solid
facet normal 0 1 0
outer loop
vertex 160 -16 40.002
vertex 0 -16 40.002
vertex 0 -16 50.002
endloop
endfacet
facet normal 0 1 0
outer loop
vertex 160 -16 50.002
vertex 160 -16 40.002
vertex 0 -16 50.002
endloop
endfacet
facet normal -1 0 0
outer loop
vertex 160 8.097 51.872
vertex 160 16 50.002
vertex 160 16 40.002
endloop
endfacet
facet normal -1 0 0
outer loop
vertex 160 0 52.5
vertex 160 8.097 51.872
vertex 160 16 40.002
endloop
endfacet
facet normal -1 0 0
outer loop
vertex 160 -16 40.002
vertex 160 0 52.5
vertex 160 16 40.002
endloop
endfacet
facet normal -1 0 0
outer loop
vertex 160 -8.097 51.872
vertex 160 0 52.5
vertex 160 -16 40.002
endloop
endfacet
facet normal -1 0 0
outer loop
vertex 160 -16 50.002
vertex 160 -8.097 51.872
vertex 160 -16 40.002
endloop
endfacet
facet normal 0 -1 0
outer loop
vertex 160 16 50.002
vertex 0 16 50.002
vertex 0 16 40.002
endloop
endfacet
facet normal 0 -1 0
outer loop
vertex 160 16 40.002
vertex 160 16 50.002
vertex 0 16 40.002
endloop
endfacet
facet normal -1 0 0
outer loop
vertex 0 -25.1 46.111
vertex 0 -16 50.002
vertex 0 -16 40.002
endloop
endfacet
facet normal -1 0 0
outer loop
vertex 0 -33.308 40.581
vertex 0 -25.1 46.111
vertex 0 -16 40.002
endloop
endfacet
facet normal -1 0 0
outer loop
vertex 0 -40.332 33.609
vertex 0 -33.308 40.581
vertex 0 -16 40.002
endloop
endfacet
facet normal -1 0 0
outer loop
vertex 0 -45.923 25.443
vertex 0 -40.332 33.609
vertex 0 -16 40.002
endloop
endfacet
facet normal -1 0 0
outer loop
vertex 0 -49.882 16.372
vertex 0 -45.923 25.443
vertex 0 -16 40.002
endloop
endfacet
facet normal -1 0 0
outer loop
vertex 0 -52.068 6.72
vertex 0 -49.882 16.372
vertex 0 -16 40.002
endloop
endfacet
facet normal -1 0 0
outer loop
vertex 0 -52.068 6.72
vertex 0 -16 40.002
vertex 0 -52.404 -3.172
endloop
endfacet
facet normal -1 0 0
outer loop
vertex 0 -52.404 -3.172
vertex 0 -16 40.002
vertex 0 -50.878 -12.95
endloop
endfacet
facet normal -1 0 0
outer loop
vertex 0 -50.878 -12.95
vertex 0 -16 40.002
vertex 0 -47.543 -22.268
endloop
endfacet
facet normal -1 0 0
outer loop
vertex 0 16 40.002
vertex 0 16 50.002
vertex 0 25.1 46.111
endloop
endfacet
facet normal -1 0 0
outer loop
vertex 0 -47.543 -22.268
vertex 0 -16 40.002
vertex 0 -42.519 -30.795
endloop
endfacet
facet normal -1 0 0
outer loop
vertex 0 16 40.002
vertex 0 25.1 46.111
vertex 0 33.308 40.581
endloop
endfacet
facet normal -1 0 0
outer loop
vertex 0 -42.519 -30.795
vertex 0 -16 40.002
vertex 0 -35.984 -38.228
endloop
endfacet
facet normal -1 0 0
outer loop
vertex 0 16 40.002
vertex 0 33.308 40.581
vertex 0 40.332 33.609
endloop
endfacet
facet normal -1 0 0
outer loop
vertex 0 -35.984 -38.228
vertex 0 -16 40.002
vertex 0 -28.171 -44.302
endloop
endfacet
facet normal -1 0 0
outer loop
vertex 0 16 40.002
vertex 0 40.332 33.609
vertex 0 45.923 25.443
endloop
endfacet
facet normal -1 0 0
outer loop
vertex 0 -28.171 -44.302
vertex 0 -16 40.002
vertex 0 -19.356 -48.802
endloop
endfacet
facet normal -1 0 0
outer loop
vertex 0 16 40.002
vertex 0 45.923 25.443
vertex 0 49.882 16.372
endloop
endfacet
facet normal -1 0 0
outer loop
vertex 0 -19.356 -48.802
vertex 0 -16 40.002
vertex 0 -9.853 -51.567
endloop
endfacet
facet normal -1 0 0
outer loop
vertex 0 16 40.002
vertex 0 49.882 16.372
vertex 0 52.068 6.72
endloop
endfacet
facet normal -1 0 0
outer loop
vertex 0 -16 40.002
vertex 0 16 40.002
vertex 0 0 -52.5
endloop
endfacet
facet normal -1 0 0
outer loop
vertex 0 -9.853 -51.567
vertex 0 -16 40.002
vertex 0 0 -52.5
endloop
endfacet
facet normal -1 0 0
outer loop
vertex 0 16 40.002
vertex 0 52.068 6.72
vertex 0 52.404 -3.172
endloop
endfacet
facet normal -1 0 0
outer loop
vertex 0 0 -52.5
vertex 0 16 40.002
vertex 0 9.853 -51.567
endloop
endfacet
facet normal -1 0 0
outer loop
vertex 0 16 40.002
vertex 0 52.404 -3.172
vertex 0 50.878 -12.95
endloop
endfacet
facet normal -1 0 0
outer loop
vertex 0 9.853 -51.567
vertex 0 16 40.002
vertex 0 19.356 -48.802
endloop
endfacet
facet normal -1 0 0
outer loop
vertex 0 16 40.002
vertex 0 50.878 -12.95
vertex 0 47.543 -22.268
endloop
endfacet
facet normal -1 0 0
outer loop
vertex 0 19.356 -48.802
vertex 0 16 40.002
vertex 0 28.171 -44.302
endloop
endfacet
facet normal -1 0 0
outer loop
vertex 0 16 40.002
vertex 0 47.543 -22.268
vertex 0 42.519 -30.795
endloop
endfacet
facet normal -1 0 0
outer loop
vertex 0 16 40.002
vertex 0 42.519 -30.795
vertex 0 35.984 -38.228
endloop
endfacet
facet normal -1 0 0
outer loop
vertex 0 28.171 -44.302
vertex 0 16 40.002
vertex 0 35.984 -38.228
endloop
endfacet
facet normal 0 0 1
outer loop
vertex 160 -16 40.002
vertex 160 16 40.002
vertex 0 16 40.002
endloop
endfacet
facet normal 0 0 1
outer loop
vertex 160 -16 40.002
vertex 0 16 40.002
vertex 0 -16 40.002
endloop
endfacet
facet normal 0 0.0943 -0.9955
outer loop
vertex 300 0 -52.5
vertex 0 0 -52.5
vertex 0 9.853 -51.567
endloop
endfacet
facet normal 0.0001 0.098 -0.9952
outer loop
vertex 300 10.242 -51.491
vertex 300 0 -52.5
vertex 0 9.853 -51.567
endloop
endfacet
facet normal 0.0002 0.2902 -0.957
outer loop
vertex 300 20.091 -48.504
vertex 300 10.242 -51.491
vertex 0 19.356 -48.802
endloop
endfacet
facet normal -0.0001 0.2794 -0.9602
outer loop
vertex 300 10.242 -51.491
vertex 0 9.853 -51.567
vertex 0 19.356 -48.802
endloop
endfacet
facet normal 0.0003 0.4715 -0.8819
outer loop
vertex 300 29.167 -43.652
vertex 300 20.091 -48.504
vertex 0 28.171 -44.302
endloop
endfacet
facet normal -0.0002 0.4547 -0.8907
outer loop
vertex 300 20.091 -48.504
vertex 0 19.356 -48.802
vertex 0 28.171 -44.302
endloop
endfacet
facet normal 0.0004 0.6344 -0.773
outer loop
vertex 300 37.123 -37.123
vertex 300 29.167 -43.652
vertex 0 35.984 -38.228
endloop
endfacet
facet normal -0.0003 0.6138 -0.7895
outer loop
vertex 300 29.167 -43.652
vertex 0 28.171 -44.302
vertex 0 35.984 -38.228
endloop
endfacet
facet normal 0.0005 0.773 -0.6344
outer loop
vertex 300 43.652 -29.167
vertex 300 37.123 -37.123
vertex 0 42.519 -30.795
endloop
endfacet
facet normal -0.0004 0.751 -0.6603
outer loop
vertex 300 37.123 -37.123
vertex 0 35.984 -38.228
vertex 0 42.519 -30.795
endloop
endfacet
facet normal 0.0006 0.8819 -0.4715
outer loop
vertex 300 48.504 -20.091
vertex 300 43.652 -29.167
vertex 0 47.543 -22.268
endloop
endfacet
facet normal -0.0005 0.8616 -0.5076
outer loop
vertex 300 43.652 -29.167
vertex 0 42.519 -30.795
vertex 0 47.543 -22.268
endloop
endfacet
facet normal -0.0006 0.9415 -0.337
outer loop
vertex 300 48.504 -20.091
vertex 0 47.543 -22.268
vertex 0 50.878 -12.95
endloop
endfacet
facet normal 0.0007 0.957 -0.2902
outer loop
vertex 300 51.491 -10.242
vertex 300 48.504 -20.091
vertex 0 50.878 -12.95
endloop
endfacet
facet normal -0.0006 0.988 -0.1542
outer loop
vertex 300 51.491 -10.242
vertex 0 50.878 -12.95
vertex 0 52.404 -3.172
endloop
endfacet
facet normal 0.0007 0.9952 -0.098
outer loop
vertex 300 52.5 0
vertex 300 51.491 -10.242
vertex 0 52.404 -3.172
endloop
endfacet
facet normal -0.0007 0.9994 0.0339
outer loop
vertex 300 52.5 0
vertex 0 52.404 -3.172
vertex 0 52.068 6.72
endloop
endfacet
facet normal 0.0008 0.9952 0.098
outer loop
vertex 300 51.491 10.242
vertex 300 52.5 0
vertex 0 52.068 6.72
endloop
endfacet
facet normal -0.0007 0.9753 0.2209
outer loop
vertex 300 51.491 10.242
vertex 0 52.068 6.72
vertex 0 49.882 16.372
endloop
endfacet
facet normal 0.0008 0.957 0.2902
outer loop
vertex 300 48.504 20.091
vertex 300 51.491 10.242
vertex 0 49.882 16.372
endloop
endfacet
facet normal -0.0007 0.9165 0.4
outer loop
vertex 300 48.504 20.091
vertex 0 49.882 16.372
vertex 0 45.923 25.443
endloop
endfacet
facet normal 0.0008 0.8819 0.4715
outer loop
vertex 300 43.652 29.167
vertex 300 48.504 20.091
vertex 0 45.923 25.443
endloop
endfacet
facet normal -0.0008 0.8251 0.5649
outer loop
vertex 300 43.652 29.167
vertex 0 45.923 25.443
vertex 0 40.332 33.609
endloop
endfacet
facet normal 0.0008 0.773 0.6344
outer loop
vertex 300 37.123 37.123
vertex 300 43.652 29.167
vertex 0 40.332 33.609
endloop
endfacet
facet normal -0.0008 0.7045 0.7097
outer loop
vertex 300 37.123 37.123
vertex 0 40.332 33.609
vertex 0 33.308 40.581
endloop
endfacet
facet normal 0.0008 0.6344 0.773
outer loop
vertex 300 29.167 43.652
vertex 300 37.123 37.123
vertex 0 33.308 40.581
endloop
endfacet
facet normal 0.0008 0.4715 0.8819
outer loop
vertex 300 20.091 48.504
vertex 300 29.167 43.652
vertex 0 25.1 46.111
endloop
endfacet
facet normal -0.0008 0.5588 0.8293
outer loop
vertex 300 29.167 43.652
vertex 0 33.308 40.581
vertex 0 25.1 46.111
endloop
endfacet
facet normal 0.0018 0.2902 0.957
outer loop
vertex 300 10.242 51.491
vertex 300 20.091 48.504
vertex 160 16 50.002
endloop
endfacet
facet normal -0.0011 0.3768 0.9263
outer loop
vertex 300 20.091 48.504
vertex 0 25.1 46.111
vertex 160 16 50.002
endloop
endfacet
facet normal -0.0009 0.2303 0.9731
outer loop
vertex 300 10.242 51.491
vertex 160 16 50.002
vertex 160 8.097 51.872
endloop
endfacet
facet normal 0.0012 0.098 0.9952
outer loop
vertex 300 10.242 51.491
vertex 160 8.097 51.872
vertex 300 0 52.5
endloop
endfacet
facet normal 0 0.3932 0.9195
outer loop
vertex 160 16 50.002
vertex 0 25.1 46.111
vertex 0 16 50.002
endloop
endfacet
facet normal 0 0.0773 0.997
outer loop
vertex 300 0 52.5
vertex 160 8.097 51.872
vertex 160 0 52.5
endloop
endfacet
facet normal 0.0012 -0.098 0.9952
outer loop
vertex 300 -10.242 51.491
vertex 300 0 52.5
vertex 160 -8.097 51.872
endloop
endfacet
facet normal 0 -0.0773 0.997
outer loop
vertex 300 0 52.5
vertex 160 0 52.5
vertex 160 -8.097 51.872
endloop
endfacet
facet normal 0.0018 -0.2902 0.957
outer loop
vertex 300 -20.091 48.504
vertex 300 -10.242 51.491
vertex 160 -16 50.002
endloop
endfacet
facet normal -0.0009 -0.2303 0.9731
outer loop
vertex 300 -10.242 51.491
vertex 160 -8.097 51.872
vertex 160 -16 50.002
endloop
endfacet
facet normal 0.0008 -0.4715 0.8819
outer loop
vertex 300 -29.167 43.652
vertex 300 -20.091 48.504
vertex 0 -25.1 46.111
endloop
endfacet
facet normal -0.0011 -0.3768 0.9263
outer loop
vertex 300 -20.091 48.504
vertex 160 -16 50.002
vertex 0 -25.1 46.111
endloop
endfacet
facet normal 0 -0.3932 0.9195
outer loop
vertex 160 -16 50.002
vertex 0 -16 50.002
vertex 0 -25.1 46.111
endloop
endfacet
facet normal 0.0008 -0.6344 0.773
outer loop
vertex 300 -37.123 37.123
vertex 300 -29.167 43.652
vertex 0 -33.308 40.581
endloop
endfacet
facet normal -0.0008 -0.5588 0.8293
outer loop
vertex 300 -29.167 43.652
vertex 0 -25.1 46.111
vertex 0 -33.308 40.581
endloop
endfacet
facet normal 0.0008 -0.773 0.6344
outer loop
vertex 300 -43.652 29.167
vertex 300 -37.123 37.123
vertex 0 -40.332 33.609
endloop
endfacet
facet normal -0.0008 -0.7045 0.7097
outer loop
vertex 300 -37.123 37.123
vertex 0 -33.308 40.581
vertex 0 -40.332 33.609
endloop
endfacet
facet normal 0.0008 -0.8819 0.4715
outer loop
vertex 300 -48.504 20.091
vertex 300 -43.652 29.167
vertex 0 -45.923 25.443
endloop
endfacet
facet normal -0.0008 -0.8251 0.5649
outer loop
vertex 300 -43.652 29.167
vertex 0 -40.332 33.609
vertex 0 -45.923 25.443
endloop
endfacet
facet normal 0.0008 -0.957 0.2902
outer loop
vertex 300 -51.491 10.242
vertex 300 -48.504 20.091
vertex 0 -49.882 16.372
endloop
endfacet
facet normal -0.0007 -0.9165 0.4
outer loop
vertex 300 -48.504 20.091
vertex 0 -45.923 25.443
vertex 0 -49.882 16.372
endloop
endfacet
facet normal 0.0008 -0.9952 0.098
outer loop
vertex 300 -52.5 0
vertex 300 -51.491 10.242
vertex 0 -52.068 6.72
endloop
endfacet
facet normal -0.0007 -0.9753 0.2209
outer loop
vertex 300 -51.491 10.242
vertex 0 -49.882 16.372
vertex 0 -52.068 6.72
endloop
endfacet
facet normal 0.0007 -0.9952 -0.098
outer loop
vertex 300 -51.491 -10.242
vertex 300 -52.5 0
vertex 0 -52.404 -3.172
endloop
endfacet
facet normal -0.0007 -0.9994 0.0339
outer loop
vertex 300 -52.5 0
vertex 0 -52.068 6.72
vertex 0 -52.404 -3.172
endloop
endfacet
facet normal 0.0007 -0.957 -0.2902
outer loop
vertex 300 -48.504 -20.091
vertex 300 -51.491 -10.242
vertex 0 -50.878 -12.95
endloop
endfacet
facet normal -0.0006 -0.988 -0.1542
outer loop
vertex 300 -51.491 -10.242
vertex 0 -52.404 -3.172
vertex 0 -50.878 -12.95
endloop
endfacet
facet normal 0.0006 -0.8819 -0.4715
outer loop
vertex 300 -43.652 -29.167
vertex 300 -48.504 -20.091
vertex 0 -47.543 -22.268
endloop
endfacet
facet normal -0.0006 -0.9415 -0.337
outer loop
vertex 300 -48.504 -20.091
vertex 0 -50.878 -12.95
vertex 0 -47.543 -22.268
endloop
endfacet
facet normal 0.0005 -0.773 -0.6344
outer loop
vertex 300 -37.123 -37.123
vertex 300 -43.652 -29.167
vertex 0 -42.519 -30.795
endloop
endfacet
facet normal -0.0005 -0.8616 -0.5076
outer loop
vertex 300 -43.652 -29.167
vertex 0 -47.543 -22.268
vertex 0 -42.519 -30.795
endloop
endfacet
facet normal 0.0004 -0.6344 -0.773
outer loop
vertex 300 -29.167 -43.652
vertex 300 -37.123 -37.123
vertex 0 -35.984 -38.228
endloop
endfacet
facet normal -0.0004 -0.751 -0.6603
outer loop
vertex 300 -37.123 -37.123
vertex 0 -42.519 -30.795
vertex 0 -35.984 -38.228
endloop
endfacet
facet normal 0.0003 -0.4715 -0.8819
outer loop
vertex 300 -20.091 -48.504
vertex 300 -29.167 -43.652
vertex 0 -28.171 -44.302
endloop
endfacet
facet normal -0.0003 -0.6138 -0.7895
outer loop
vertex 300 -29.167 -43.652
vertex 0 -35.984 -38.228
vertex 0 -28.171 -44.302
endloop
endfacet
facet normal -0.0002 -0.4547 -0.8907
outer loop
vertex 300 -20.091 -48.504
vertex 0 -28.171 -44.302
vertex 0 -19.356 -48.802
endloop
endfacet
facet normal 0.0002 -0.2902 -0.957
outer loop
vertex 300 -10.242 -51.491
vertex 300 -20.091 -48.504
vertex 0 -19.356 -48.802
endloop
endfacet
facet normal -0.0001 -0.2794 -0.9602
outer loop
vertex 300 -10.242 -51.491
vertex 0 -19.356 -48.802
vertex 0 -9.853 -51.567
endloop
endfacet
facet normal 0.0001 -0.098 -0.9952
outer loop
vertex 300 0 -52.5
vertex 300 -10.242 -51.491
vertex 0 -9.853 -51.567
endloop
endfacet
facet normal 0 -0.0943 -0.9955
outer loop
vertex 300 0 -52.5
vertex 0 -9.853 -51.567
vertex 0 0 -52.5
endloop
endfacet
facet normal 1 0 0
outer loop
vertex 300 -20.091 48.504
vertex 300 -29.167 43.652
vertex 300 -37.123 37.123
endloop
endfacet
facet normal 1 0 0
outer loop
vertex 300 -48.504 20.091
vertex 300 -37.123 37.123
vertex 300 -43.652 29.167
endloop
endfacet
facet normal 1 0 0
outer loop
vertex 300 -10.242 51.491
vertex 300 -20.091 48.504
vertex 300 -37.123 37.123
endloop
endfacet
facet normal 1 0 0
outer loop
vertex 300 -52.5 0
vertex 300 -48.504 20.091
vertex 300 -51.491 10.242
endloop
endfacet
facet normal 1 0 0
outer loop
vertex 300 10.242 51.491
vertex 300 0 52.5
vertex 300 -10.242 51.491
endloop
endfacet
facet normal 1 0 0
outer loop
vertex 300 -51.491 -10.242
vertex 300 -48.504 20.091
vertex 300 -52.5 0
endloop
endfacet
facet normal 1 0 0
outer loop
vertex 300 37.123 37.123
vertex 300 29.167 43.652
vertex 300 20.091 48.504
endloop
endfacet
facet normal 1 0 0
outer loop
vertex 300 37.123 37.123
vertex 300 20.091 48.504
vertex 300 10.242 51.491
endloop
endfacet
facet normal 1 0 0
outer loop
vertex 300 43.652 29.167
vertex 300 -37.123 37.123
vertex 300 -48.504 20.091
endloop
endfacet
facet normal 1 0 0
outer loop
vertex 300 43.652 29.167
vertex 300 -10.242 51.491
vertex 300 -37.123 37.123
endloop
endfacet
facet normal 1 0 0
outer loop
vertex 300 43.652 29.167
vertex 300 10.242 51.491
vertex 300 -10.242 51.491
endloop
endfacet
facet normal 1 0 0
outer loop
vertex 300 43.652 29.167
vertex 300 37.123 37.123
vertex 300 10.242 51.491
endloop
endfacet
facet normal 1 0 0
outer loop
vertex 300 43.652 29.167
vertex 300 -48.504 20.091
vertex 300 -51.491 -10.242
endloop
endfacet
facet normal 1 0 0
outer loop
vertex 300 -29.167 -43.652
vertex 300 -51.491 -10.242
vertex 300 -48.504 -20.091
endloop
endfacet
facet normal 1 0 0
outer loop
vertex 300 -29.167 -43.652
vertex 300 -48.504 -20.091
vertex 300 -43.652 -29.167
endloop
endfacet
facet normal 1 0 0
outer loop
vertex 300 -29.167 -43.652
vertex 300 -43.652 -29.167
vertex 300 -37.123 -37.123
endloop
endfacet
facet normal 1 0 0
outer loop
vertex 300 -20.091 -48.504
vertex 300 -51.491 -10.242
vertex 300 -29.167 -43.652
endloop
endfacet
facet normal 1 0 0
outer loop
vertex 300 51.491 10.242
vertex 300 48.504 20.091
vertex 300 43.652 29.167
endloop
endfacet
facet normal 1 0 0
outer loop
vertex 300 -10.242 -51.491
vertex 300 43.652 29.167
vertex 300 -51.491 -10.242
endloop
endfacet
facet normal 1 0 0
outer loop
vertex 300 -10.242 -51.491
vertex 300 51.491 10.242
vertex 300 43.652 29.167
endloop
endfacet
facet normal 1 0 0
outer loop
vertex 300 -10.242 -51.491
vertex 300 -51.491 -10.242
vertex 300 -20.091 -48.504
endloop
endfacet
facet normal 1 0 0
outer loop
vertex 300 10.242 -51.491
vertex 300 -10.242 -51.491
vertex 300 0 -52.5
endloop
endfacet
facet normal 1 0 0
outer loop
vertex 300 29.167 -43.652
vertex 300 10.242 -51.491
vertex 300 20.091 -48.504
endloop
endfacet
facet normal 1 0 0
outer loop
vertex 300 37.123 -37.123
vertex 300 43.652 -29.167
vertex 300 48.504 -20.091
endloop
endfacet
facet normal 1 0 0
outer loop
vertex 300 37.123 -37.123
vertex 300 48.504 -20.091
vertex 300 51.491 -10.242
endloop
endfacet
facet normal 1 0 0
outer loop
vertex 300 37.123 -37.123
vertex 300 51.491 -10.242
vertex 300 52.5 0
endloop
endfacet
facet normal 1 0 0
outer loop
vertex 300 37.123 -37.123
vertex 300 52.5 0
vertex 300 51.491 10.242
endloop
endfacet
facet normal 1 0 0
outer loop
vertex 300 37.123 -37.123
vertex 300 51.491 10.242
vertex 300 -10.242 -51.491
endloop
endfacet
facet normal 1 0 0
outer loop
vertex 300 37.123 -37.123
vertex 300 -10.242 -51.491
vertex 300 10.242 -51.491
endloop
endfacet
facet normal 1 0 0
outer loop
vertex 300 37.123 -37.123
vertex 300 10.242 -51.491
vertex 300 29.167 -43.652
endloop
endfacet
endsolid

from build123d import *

# Parameters (mm, degrees)
SKETCH1_R           = 52.5
BOSS_EXTRUDE1_DEPTH = 300
CUT_EXTRUDE1_DEPTH  = 160


with BuildPart() as part:
    # Sketch1 → Boss-Extrude1 (new body)
    with BuildSketch(Plane.YZ):
        with Locations(Location((0, 0, 0), (0, 0, 270))):
            Circle(SKETCH1_R)
    extrude(amount=BOSS_EXTRUDE1_DEPTH)

    # Sketch2 → Cut-Extrude1 (cut)
    with BuildSketch(Plane(origin=(0, 0, 0), x_dir=(0, -1, 0), z_dir=(-1, 0, 0))):
        with BuildLine():
            Line((-16, 40.002499938), (16, 40.002499938))
            Line((16, 40.002499938), (16, 50.002499938))
            ThreePointArc((16, 50.002499938), (0, 52.5), (-16, 50.002499938))
            Line((-16, 50.002499938), (-16, 40.002499938))
        make_face()
    extrude(amount=-CUT_EXTRUDE1_DEPTH, mode=Mode.SUBTRACT)


solid = part.part
